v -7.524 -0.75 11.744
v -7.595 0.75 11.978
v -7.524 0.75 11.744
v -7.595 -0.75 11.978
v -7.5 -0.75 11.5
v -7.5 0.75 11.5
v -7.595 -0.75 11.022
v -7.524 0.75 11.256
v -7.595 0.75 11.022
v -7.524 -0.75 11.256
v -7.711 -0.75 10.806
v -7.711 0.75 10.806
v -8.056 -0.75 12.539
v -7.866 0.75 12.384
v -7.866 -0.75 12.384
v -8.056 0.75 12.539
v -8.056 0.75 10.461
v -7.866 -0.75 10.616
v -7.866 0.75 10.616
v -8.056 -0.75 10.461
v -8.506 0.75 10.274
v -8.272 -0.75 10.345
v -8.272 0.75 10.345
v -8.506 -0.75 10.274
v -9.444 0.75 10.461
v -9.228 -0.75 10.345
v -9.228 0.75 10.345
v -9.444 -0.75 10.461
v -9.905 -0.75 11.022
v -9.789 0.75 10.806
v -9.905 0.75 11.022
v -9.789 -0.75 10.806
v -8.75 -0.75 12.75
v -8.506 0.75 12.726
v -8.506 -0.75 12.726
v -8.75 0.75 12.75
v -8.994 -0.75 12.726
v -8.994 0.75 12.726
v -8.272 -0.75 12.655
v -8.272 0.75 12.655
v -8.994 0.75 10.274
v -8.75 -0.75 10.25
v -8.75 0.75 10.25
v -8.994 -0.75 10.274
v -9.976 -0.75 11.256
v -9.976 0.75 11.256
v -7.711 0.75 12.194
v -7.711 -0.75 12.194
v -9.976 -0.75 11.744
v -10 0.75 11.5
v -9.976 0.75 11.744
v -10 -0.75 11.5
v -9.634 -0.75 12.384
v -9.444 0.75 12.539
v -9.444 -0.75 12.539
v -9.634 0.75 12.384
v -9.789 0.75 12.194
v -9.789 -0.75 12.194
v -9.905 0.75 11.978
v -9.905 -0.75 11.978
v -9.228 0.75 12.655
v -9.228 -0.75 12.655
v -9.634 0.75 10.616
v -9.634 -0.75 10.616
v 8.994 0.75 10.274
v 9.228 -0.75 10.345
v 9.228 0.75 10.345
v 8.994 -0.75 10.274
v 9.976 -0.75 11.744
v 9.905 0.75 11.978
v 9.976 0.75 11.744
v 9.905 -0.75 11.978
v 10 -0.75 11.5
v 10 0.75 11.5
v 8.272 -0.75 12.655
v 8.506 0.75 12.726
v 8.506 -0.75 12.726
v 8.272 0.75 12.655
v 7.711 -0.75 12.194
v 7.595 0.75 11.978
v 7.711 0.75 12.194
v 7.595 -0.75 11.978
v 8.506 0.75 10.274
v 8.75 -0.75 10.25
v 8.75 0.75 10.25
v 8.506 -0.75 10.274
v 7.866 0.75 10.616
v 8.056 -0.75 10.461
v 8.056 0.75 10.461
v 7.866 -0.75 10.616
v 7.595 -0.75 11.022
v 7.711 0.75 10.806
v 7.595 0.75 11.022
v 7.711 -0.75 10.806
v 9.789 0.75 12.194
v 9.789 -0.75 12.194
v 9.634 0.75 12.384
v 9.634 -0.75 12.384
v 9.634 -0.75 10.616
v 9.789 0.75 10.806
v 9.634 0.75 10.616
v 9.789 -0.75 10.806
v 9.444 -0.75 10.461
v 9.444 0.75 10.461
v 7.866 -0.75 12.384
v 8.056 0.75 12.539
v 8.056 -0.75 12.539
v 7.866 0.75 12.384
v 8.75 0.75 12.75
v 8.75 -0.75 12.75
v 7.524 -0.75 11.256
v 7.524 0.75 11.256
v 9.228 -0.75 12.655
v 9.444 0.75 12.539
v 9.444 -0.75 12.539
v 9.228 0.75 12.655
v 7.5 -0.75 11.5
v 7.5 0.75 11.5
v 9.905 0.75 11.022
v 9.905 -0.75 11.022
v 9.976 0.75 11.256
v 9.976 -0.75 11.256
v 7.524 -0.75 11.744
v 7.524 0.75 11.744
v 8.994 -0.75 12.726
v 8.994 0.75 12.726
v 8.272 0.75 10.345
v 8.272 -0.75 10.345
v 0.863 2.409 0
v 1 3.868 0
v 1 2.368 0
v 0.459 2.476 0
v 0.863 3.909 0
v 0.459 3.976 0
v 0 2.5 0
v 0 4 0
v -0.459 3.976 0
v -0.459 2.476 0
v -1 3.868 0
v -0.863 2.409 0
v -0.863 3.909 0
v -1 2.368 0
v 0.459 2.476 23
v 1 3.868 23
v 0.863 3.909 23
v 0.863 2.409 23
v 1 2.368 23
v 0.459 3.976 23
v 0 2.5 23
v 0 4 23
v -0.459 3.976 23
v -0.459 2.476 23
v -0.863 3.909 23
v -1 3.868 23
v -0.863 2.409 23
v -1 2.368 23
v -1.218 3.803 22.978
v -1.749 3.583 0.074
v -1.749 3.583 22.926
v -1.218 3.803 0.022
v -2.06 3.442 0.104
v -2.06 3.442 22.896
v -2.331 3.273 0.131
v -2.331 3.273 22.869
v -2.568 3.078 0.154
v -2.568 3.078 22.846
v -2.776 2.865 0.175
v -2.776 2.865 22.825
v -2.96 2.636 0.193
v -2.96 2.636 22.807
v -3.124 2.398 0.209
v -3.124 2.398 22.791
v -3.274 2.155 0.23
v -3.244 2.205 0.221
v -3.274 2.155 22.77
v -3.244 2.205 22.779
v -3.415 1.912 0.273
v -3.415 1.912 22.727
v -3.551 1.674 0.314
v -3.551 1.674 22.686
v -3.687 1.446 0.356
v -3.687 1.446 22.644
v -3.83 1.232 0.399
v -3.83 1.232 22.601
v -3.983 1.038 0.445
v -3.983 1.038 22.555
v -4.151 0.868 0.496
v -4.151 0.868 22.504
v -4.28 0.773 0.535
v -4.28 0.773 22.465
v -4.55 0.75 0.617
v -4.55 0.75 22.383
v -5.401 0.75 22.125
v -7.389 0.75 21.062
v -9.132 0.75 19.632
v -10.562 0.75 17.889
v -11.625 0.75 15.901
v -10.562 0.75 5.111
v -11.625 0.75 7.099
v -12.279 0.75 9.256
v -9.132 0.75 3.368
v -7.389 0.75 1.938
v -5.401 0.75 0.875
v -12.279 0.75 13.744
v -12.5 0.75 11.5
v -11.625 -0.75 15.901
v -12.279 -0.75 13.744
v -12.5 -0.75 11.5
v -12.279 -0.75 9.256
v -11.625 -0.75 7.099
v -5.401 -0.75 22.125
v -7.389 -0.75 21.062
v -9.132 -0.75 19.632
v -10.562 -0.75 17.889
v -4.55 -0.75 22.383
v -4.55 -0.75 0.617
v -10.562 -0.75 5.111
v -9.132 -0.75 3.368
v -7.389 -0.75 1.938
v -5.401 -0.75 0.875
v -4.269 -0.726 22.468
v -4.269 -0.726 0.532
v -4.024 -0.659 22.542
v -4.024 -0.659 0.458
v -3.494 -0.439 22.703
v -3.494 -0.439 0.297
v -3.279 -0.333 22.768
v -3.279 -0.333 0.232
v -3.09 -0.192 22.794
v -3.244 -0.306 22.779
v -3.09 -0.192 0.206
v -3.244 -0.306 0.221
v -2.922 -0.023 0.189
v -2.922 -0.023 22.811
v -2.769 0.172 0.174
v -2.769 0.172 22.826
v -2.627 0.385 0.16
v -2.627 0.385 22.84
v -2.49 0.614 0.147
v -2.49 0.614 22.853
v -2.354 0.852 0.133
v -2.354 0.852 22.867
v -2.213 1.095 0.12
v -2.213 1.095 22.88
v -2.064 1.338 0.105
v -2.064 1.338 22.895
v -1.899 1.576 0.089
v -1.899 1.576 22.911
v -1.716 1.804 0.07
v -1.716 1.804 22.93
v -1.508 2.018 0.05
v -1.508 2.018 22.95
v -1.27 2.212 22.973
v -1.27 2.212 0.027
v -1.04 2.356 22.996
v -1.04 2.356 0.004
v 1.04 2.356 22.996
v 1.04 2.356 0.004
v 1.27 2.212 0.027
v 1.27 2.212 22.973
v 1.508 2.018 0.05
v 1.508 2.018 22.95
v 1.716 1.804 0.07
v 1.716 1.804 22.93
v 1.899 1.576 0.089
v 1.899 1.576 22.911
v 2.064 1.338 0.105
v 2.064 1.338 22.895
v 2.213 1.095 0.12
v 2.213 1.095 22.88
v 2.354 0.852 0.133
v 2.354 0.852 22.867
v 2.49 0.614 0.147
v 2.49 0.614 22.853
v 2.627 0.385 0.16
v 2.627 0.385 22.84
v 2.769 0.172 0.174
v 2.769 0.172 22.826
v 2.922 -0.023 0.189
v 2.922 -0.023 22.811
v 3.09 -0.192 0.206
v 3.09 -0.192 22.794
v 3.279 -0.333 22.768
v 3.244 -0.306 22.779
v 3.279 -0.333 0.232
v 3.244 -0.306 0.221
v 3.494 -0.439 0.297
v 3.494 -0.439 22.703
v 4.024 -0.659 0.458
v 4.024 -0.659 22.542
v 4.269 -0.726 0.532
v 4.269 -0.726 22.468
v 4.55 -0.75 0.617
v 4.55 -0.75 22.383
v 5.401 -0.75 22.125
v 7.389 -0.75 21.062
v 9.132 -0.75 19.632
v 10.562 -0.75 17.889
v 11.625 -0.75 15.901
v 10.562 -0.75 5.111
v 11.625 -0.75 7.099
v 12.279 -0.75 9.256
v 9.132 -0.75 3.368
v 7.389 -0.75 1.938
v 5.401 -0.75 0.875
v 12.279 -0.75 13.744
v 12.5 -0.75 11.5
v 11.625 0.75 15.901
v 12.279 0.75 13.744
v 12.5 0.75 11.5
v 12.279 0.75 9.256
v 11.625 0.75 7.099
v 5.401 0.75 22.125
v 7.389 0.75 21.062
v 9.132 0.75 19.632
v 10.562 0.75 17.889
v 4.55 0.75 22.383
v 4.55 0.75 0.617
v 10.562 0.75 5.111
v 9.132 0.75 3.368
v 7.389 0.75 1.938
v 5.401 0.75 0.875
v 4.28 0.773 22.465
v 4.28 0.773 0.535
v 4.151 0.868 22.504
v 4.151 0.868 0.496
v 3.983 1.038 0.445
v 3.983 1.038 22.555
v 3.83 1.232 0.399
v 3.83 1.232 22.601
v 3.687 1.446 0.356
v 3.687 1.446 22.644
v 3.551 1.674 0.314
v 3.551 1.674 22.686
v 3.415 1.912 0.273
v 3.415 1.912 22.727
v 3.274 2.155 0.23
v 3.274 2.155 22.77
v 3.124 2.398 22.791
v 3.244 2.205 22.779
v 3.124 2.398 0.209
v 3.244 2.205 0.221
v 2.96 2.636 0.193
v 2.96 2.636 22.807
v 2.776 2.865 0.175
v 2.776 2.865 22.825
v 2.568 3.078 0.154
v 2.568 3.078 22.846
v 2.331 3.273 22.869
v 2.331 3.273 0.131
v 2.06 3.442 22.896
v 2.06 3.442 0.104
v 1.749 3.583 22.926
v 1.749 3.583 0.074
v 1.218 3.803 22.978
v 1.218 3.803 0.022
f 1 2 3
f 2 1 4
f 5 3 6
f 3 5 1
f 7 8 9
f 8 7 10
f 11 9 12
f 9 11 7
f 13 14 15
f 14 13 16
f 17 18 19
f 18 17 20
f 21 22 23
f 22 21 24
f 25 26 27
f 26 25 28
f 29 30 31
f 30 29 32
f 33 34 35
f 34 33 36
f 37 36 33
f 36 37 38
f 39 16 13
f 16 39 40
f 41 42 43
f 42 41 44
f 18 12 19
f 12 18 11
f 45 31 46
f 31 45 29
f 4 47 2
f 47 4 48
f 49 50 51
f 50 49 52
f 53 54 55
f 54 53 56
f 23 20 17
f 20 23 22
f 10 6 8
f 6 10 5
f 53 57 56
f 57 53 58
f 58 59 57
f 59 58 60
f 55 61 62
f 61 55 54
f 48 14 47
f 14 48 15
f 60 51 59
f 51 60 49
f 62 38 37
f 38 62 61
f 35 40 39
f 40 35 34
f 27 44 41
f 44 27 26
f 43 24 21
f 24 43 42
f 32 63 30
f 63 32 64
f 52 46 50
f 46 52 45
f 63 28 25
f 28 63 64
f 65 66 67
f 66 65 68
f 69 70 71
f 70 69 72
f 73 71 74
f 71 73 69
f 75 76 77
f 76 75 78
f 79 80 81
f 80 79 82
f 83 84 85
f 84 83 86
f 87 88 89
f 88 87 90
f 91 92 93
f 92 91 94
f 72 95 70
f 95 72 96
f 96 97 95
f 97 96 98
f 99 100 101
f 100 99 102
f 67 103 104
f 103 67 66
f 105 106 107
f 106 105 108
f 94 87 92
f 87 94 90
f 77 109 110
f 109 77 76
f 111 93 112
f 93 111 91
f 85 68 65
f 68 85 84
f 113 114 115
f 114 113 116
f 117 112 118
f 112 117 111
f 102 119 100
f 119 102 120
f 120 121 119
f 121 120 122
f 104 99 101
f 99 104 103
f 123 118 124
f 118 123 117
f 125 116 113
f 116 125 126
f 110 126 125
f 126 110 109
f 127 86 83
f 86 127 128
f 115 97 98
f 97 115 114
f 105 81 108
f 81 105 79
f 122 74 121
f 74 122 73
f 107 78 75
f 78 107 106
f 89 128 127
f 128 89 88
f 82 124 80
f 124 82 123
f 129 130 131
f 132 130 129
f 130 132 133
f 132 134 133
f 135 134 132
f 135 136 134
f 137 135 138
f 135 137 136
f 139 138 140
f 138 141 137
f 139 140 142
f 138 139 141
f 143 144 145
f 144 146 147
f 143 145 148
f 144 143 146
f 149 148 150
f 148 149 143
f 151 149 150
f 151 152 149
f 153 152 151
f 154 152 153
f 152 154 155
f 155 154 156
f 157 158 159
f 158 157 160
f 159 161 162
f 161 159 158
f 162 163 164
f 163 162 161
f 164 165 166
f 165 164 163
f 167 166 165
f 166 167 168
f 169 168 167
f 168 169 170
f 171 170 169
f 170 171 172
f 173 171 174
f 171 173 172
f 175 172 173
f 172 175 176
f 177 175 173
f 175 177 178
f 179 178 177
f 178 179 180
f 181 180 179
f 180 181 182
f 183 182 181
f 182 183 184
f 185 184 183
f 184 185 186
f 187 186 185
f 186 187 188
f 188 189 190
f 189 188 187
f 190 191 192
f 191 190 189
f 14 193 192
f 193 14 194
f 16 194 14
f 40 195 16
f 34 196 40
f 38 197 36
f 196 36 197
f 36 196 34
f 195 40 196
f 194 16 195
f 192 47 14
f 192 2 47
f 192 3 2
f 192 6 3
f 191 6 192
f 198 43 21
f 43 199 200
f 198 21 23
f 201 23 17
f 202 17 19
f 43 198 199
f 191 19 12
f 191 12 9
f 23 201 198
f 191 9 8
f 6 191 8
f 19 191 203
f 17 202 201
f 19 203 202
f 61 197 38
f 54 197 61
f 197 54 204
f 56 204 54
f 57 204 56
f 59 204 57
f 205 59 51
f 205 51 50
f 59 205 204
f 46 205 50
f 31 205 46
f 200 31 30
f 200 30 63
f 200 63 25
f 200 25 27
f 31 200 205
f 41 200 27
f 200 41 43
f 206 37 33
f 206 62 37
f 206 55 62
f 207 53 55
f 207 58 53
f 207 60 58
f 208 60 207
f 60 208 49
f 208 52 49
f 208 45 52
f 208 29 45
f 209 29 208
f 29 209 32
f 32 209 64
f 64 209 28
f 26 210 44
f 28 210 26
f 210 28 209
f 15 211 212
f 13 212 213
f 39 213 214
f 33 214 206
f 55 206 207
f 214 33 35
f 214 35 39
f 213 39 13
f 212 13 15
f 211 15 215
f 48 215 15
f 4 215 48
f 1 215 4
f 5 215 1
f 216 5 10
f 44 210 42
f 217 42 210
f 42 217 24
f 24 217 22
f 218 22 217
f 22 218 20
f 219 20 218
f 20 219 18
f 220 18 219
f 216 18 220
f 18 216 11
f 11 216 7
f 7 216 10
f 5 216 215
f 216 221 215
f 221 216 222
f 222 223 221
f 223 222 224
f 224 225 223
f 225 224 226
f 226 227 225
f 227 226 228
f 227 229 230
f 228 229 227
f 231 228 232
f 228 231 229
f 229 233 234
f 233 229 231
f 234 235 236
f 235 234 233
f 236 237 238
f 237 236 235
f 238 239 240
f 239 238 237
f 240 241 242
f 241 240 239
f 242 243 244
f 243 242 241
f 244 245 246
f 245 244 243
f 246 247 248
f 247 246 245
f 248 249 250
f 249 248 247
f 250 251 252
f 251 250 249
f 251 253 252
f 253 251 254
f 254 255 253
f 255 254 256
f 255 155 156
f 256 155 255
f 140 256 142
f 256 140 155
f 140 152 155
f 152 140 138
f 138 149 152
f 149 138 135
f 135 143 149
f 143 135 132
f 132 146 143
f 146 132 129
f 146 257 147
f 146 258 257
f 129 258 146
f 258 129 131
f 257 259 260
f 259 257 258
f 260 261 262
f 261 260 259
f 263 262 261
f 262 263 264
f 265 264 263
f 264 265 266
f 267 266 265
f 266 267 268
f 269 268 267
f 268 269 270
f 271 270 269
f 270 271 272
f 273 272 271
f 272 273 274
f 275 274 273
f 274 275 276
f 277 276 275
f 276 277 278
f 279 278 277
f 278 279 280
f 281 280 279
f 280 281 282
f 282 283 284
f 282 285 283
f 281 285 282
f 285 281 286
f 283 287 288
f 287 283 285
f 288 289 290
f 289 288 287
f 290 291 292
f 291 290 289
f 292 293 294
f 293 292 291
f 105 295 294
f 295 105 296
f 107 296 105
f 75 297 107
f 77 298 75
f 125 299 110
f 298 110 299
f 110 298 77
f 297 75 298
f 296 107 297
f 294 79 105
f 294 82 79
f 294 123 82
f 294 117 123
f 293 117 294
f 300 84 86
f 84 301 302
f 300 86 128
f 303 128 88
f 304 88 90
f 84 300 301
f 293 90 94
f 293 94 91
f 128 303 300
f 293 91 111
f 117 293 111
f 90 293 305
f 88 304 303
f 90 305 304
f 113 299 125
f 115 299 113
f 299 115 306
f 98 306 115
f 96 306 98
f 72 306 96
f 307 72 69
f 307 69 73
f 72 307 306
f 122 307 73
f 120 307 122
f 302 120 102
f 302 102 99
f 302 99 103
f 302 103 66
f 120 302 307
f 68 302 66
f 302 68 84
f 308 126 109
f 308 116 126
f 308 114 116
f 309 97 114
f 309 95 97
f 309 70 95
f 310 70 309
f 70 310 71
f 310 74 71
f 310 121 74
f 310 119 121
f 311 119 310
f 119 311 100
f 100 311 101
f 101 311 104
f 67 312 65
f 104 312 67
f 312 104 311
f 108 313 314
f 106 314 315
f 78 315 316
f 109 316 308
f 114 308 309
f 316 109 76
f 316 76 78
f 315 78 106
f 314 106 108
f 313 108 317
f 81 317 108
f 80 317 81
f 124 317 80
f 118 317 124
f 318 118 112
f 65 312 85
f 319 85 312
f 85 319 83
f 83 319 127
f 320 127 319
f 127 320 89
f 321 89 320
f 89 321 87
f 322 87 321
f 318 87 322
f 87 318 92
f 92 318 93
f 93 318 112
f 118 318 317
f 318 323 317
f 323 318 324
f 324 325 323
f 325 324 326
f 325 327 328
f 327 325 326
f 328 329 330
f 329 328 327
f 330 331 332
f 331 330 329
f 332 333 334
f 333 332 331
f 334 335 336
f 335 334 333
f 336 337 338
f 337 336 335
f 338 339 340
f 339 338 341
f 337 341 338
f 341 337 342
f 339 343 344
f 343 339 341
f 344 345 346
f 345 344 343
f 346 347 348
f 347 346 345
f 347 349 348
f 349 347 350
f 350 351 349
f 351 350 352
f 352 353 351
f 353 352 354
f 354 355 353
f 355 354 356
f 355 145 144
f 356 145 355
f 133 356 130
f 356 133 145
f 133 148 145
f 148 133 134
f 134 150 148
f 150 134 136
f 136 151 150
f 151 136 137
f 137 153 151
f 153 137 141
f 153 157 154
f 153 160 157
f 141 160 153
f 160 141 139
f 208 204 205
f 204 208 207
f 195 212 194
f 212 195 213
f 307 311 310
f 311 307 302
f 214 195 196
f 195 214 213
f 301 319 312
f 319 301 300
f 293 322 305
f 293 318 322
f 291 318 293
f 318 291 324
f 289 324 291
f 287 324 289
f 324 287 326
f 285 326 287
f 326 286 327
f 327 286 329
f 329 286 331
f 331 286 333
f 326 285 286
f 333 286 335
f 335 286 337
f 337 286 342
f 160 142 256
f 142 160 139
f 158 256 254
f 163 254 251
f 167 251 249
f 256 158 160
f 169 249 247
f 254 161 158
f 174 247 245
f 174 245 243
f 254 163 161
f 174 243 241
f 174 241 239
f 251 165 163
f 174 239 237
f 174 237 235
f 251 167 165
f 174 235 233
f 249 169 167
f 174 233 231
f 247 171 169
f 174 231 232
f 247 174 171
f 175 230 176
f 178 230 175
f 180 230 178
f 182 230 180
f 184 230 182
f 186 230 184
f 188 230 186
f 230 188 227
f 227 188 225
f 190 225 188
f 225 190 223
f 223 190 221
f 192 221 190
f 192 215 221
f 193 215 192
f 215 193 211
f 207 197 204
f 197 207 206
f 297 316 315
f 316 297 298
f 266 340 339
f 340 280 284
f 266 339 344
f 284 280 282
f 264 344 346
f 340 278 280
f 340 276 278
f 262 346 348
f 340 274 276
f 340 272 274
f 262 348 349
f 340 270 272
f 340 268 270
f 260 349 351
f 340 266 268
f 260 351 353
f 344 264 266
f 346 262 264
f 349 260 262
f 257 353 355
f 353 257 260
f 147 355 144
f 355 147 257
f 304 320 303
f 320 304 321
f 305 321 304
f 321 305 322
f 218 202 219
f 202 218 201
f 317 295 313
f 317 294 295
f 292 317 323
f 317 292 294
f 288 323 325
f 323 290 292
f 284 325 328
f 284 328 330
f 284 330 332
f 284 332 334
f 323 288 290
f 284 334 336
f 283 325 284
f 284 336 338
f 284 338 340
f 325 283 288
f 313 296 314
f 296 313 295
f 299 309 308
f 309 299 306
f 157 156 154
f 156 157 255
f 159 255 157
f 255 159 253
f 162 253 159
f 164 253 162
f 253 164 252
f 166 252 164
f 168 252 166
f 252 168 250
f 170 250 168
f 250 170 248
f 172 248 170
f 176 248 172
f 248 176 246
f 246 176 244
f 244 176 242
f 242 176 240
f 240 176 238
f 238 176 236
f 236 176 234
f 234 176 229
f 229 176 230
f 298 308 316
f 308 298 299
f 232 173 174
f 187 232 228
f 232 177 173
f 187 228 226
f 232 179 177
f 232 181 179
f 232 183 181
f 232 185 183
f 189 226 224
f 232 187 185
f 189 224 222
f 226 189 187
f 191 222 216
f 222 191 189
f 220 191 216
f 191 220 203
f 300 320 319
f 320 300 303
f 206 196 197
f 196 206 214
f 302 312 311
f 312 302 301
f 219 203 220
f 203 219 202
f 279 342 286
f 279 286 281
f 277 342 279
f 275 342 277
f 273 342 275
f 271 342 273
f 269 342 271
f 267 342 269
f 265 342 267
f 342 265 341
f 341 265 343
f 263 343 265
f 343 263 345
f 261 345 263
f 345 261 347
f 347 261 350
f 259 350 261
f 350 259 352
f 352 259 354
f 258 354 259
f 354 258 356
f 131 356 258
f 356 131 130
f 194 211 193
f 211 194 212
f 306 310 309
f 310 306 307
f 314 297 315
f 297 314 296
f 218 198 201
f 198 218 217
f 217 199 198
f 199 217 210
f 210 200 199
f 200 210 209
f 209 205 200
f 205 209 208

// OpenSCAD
// file: ribbon.scad
module ribbon(points, thickness=1, closed=false) {
    p = closed ? concat(points, [points[0]]) : points;
    
    union() {
        for (i=[1:len(p)-1]) {
            hull() {
                translate(p[i-1]) 
                    if ($children==0)
                        circle(d=thickness, $fn=8);
                    else
                        children();
                translate(p[i]) 
                    if ($children==0)
                        circle(d=thickness, $fn=8);
                    else
                        children();
            }
        }
    }
}

pi = 3.1415926535897932;
function SIN(theta) = sin(theta * 180 / pi);
function COS(theta) = cos(theta * 180 / pi);
function TAN(theta) = tan(theta * 180 / pi);

//<skip>
color("red") linear_extrude(height=10)
 ribbon([for (theta=[0:0.1:2*pi]) [theta * 10 / (2*pi), SIN(theta) * 10 / (2*pi)]], thickness=3, height=10, closed=true);
color("blue") linear_extrude(height=10)
 ribbon([for (theta=[0:0.1:2*pi]) [theta * 10 / (2*pi), SIN(theta) * 10 / (2*pi)]], thickness=.1, height=10, closed=true);
ribbon([for (theta=[0:0.1:2*pi+.1]) [COS(theta)*10, SIN(3*theta) * 10]], thickness=.5);
//</skip>
    
// main file
use <bezier.scad>;
use <ribbon.scad>;

//<params>
cableDiameter=5;
tieThickness=1.5;
tieWidth=23;
tieLength=25;
screwHoleDiameter=2.5;
//</params>

module dummy() {}

$fn=32;

cableDiameter1 = cableDiameter+2*tieThickness/2;

curve = [ [-tieLength/2,0], OFFSET([tieLength/4,0]),
          OFFSET([-tieLength/4,0]),
          [-cableDiameter1/2-cableDiameter1*.2,0],
          OFFSET([cableDiameter*.4,0]), 
          OFFSET([-cableDiameter1*.5,0]),
          [0,cableDiameter1/2],
          REPEAT_MIRRORED([1,0])];


render(convexity=2)
intersection() {
    difference() {
        linear_extrude(height=tieWidth) ribbon(Bezier(curve),tieThickness);           
        for(s=[-1:2:1])
           translate([s*tieLength*0.35,0,tieWidth/2]) 
               rotate([90,0,0]) translate([0,0,-tieThickness*2]) cylinder(d=screwHoleDiameter,h=tieThickness*4);
    }
    translate([0,0,tieWidth/2])
    rotate([90,0,0])
    translate([0,0,-(tieThickness+cableDiameter)*2])
    linear_extrude(h=(tieThickness+cableDiameter)*4)
    hull() {
        translate([-tieLength/2+tieWidth/2,0]) circle(d=tieWidth);
        translate([tieLength/2-tieWidth/2,0]) circle(d=tieWidth);        
    }
}
